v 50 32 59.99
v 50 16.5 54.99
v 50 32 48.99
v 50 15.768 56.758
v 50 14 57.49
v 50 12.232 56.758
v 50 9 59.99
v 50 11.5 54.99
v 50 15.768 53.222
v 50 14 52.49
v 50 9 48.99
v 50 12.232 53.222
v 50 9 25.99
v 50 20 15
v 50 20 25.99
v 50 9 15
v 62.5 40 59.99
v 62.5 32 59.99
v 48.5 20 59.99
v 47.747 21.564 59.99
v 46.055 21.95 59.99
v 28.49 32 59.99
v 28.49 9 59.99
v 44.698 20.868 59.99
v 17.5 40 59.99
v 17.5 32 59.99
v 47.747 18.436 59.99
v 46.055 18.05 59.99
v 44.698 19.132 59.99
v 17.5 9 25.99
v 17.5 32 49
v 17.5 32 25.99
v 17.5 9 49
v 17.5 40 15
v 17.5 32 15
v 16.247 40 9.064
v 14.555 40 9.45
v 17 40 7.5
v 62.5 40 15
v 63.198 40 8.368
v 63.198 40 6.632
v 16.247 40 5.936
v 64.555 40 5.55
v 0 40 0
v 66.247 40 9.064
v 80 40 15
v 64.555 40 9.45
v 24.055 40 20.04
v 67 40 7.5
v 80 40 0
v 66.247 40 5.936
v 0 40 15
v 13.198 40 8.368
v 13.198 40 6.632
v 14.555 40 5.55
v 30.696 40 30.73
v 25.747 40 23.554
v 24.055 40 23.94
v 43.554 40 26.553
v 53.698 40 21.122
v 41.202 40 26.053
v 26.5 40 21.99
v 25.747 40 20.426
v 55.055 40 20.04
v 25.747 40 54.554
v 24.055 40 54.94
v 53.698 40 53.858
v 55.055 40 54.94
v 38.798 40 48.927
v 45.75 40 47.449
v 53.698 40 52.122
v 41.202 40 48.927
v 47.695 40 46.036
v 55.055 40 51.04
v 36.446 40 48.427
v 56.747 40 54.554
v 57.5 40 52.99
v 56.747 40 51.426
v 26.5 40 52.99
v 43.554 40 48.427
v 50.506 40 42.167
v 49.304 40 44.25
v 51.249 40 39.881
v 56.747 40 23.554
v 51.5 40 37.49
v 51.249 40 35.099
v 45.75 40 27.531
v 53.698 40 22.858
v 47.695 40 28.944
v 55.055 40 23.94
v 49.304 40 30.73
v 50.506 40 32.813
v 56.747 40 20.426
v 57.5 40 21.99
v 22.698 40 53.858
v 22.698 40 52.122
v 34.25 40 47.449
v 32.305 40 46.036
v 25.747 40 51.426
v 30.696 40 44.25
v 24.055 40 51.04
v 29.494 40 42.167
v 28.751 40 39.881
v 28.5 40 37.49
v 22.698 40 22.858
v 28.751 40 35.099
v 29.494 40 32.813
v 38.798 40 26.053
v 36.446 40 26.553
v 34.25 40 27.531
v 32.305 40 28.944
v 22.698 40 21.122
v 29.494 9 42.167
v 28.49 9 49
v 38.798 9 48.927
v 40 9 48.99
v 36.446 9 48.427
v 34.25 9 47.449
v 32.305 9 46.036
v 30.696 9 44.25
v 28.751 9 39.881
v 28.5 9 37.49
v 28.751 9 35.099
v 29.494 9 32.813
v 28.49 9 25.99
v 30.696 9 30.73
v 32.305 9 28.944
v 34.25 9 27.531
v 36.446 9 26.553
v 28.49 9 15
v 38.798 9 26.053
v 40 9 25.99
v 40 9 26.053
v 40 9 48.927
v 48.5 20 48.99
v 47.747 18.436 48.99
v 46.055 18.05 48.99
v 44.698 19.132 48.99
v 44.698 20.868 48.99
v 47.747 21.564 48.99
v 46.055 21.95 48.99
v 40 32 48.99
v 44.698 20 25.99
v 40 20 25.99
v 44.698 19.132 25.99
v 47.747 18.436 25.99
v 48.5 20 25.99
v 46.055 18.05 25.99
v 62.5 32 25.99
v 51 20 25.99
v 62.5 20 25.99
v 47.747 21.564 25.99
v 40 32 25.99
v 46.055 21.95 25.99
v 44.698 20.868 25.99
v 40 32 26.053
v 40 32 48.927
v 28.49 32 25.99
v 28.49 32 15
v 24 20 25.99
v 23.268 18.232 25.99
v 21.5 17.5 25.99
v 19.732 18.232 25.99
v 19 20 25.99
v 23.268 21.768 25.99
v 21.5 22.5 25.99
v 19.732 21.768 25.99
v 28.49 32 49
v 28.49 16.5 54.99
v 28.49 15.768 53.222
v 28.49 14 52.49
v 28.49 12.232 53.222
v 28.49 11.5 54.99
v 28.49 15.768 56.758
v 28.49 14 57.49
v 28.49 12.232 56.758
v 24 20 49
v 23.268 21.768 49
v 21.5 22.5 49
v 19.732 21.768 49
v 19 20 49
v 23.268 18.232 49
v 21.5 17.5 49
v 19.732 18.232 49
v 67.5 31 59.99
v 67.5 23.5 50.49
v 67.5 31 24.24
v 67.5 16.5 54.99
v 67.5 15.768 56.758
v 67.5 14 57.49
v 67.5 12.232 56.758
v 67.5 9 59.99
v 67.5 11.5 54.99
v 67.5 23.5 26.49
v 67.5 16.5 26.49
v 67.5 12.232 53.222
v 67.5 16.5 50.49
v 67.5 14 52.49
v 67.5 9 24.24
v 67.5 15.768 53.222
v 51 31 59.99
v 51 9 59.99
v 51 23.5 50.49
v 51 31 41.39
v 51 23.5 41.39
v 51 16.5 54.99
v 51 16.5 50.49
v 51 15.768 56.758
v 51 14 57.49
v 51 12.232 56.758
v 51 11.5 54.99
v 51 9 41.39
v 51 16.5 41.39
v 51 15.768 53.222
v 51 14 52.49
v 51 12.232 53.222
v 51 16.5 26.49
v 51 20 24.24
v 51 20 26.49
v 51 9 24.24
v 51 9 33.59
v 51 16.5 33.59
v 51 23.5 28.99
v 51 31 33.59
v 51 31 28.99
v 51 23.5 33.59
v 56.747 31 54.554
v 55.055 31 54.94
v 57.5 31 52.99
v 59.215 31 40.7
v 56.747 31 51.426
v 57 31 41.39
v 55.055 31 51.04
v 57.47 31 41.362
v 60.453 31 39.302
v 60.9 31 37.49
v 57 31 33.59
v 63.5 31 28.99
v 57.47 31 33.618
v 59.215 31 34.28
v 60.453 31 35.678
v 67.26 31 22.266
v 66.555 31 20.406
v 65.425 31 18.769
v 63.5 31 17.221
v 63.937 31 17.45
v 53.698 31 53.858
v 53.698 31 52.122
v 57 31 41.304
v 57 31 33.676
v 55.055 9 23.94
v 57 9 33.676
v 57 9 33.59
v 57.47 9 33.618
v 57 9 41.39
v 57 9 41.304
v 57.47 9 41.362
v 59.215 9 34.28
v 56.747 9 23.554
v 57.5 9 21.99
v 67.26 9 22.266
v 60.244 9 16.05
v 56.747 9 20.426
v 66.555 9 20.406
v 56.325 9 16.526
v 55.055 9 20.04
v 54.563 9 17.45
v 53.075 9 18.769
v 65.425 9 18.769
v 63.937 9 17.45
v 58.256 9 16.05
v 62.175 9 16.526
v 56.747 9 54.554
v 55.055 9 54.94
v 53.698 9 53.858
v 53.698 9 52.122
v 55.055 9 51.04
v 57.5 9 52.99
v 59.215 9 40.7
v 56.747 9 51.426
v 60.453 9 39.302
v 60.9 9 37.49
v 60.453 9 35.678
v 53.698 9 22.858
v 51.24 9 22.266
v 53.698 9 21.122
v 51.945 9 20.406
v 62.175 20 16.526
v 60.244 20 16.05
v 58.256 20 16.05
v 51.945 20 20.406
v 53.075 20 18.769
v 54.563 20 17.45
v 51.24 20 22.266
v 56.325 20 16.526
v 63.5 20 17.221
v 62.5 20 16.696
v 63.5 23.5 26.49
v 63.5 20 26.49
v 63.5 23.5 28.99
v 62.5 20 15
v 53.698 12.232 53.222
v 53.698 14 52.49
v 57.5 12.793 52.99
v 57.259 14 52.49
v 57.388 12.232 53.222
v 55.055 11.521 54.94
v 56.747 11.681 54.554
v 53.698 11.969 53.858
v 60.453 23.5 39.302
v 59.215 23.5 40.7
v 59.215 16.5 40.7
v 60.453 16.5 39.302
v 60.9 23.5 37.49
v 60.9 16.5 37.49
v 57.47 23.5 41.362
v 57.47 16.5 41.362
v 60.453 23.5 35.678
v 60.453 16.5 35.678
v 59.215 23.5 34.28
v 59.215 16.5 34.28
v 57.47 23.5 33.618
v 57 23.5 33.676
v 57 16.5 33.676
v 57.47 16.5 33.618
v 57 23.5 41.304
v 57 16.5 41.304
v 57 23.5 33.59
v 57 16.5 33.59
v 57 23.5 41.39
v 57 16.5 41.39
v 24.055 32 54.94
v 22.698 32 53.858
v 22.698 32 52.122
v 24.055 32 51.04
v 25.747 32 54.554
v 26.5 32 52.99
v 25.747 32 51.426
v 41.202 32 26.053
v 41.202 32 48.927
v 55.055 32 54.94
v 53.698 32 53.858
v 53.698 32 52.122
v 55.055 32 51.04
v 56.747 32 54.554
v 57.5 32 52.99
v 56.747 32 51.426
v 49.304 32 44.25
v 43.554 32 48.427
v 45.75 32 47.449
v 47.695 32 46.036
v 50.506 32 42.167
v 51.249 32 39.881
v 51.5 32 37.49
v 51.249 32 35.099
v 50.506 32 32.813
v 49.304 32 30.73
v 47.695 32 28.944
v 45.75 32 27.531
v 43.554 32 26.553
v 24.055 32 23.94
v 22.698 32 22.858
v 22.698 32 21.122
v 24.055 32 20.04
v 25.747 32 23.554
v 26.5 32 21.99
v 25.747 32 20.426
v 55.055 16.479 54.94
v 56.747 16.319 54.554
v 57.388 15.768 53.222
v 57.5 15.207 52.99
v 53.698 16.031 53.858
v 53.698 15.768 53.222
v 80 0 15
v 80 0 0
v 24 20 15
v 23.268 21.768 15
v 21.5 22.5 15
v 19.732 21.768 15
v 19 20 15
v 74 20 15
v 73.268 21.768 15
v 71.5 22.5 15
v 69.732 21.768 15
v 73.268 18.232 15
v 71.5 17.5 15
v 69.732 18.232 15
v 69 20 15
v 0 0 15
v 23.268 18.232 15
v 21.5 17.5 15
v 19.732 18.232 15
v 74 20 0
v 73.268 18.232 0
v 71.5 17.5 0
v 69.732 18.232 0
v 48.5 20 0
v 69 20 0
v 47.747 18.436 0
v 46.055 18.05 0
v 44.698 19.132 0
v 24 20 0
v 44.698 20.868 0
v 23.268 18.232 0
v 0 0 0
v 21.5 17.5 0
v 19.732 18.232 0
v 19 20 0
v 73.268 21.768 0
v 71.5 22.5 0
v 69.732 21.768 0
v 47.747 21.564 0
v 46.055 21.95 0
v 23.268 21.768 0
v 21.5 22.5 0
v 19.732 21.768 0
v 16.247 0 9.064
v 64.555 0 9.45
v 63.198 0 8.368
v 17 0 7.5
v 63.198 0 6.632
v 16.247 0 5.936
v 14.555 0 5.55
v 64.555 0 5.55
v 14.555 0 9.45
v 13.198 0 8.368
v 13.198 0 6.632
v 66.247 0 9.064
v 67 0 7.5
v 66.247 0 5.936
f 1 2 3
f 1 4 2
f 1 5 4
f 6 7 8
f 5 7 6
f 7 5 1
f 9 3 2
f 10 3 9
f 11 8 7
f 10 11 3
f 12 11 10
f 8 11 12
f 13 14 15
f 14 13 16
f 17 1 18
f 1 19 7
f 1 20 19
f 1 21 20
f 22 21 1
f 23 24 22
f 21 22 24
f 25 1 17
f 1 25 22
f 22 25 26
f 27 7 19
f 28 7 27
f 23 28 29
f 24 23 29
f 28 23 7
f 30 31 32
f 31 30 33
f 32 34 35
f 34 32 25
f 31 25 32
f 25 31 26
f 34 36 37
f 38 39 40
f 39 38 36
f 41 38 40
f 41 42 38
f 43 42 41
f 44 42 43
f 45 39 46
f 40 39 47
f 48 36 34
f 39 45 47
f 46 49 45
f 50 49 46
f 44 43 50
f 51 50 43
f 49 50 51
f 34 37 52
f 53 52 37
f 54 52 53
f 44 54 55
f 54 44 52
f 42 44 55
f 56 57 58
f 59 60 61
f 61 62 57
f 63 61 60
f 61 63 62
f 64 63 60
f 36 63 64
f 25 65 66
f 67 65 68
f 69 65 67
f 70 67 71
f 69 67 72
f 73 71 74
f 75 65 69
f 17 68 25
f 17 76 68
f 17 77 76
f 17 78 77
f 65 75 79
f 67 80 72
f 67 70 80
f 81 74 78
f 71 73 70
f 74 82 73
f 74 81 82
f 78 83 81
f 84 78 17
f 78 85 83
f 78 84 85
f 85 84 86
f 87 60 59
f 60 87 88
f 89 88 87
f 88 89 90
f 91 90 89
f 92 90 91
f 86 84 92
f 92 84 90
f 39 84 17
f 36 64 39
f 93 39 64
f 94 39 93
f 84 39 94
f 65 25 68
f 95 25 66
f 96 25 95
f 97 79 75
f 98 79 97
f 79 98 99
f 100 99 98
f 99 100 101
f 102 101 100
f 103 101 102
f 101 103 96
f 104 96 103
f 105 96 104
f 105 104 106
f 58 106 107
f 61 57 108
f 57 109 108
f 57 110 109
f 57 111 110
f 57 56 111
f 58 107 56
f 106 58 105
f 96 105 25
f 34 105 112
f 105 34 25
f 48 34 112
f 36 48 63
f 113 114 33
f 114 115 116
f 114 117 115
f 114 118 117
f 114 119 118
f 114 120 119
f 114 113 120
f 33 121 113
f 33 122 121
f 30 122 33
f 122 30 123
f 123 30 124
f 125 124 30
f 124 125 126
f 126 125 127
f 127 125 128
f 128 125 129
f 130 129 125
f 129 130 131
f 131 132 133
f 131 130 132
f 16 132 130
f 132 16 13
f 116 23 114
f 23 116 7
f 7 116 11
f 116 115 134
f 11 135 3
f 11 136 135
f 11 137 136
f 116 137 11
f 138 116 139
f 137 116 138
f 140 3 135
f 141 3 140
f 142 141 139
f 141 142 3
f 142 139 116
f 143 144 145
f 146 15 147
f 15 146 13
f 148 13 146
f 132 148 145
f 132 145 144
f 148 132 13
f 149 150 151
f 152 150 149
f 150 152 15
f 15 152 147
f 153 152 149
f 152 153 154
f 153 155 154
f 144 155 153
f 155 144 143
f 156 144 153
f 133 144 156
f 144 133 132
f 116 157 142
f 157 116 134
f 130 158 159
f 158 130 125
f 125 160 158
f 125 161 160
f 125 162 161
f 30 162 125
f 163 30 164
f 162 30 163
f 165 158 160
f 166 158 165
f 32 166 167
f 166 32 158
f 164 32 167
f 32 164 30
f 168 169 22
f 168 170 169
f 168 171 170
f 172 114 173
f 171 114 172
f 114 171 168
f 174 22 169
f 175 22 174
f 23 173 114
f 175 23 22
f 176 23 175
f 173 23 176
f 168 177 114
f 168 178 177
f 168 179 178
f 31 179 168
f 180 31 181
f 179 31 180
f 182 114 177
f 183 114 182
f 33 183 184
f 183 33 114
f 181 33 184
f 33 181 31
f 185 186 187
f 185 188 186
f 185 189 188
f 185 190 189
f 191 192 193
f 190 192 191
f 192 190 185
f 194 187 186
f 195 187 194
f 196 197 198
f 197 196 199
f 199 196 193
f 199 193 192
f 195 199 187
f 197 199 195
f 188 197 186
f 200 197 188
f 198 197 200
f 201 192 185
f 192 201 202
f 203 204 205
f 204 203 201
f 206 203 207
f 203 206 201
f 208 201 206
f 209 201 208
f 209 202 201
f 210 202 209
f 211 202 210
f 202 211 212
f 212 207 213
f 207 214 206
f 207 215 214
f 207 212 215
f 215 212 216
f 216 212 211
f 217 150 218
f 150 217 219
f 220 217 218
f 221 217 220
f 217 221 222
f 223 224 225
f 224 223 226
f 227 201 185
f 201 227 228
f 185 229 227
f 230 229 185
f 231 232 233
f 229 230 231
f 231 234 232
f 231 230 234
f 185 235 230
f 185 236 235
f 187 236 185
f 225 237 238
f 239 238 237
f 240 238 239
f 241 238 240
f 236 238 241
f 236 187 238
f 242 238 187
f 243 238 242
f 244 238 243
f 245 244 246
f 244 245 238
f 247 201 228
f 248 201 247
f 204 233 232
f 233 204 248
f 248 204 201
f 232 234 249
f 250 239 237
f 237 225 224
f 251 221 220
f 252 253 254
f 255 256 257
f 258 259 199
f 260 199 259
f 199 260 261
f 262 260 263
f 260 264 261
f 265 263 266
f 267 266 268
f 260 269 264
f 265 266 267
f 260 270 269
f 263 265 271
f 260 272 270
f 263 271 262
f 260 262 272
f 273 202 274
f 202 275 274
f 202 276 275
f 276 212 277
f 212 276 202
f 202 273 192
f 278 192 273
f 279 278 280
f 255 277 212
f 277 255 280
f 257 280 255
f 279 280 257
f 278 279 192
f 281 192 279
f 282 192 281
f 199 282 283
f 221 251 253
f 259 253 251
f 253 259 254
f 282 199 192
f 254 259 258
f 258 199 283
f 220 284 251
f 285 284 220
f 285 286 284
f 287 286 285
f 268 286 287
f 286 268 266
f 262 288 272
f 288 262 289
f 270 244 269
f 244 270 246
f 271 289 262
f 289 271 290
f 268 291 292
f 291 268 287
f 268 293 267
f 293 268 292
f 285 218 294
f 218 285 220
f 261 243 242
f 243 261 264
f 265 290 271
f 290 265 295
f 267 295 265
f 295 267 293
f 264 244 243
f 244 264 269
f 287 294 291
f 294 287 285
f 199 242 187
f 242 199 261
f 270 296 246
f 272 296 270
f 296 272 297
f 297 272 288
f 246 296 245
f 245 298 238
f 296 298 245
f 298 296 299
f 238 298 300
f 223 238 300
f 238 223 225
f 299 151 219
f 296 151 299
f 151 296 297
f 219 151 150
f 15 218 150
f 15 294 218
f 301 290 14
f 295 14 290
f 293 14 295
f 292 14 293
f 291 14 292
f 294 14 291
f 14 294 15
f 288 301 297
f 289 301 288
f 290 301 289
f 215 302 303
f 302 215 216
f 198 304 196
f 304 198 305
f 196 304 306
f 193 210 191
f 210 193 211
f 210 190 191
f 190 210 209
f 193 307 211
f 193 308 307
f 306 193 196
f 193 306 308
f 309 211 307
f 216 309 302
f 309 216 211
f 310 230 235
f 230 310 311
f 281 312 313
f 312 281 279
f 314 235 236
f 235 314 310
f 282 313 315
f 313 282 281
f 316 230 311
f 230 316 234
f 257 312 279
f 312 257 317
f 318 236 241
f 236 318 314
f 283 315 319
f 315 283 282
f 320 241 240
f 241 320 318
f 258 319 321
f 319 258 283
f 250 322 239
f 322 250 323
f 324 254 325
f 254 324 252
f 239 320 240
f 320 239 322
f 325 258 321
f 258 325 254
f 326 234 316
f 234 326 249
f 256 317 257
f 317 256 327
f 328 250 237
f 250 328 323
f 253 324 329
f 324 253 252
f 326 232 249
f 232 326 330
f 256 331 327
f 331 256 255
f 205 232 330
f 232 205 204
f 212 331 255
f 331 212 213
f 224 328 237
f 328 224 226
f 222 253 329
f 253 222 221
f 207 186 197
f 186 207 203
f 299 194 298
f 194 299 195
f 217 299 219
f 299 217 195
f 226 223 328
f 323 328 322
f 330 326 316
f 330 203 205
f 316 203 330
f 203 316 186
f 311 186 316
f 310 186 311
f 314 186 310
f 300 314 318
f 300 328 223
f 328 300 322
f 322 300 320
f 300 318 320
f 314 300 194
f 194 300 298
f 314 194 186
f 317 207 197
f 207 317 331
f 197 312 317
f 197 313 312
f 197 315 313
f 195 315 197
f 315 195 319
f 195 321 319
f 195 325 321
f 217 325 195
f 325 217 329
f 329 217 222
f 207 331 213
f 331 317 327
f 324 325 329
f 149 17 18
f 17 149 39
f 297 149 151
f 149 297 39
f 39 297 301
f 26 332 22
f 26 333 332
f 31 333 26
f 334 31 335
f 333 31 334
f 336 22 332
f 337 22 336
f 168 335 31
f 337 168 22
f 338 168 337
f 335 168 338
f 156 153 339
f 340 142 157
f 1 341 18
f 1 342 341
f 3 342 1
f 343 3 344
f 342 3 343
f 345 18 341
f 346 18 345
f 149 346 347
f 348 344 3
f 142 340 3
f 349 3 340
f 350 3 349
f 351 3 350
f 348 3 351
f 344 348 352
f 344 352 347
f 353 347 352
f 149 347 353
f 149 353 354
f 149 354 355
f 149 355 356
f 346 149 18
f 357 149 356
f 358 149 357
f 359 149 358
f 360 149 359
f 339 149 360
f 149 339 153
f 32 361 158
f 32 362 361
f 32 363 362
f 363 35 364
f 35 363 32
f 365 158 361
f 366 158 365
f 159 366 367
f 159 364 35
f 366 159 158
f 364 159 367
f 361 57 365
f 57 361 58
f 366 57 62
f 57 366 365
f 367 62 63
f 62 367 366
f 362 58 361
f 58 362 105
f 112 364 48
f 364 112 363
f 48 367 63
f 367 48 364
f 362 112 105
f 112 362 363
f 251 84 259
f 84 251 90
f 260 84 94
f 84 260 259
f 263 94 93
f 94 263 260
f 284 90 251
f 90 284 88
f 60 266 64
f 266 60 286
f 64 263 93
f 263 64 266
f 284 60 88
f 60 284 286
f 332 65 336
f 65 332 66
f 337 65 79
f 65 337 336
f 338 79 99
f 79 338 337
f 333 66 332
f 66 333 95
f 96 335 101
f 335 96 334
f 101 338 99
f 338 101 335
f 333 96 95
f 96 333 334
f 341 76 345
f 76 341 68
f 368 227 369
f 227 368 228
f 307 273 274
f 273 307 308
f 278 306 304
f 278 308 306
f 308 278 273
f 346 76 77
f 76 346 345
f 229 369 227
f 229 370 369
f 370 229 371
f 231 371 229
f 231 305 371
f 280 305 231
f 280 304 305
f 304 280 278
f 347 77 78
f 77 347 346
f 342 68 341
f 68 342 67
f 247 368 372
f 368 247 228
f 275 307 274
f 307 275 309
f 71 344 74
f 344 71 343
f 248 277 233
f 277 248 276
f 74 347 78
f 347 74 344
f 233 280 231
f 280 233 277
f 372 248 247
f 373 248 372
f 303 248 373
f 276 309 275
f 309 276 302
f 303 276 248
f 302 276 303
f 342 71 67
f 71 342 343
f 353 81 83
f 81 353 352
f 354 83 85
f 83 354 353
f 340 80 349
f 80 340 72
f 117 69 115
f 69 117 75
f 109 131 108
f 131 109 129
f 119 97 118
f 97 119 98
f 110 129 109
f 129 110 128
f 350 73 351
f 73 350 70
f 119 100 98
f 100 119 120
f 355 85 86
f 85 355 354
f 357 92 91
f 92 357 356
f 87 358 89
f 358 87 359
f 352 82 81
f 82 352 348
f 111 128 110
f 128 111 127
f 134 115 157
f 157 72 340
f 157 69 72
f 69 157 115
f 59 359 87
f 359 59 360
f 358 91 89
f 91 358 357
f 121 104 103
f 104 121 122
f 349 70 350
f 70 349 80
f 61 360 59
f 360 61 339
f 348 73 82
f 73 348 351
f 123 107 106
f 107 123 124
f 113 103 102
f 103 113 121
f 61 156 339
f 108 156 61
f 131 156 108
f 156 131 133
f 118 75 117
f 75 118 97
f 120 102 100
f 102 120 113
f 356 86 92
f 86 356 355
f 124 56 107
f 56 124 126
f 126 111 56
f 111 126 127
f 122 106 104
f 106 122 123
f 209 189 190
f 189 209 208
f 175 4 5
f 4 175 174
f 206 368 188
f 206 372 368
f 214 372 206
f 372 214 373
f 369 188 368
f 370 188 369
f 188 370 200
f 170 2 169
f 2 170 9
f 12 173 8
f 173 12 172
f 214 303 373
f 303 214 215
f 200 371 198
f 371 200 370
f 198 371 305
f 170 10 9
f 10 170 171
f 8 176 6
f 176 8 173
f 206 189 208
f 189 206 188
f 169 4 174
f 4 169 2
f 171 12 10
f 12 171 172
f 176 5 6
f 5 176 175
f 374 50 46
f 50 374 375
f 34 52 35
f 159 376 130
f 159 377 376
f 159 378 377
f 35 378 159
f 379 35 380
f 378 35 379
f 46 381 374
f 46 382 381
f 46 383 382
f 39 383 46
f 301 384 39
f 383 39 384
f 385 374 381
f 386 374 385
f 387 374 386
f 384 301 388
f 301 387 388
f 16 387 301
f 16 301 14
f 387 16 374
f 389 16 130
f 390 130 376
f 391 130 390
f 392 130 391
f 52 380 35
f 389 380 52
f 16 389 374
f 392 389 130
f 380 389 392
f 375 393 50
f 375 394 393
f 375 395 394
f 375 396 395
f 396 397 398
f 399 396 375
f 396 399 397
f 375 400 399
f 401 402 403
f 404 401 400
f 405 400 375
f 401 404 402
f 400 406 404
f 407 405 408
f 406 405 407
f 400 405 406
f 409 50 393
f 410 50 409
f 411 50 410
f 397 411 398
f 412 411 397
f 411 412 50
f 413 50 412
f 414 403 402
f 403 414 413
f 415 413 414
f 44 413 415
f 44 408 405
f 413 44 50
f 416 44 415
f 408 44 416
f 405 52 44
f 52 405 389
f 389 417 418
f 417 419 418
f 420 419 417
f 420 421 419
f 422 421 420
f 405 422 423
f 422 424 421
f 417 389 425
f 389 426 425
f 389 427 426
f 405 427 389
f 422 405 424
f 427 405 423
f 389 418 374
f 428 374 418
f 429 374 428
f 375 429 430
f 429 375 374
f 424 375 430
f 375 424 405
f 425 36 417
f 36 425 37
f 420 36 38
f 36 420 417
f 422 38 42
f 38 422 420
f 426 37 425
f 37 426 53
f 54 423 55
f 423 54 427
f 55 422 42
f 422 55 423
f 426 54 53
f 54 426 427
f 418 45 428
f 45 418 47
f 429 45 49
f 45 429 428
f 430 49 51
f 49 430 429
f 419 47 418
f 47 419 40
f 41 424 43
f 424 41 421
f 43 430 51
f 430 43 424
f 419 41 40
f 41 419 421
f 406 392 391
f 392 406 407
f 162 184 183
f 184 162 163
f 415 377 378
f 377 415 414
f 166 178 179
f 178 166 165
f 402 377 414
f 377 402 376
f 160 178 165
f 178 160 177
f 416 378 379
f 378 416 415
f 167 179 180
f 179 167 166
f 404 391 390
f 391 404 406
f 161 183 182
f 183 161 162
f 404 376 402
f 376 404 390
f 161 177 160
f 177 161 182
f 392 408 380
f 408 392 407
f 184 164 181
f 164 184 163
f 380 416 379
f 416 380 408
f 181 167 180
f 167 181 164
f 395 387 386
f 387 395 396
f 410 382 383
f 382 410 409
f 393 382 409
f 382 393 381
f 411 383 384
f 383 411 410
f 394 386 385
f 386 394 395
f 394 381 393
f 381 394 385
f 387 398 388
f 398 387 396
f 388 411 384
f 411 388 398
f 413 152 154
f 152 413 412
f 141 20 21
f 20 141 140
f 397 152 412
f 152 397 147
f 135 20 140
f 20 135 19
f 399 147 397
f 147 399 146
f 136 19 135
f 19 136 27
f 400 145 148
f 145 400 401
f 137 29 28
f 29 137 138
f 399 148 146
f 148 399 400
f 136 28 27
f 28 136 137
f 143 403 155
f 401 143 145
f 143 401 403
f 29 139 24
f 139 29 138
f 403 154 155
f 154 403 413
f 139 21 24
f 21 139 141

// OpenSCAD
//include <MCAD/math.scad>
//use <MCAD/motors.scad>
//mm_per_inch=25.4;


fary_largo=70; //FIXME!
filamento_diametro=3;
filamento_margen=1;

//Hobbed mini-hyena
hobbed_fuer_d=12.4;
hobbed_surco_d=10;
hobbed_dentro_d=5;
hobbed_ancho=10;
hobbed_ancho_base=7.3;

//Extrusor
bolt_hole_distance = 31;
bolt_diameter=4;
shaft_diameter=22+1;
extruder_bolt_margen=7;
extruder_largo=bolt_hole_distance+2*extruder_bolt_margen;
extruder_alto=extruder_largo;
extruder_ancho=8;

//Idler
idler_margen=1;
idler_redondeo=3;

idler_ancho=22;
idler_alto=extruder_alto-idler_margen;

	//Bisagra idler
	bisagra_largo=extruder_largo/2;
	bisagra_alto=(extruder_alto-shaft_diameter)/2;
	bisagra_ancho=idler_ancho/2+idler_margen+extruder_ancho;
	bisagra_x_offset=extruder_largo/2;
	
	//Bloque guia (idler fijo)
	guia_margen=2;
	guia_largo=extruder_largo/2+hobbed_surco_d/2+filamento_diametro+guia_margen;
	guia_alto=extruder_alto;
	guia_ancho=idler_ancho+idler_margen+extruder_ancho;

idler_largo_exceso=5;

idler_max_largo_izquierda=extruder_largo/2-(hobbed_surco_d/2+filamento_diametro+guia_margen);
idler_largo=extruder_largo/2-(hobbed_surco_d/2+filamento_diametro+guia_margen)-idler_margen+idler_largo_exceso;

idler_bolt_margen=5;



//Apoyo hotend
base_largo=80;
base_alto=15;
base_ancho=40;
  //Tornillos fary
  t_fary_d=4+1;
  t_fary_separacion=50;
  //Tornillos anclaje
  t_anclaje_d=3+1;
  t_anclaje_separacion=50;
  t_anclaje_desfase=0;
  

//Motor virtual
//translate([(base_largo-extruder_largo)/2,base_ancho,base_alto-0.01]) translate([extruder_largo/2,0,extruder_largo/2]) rotate([90,0,0]) stepper_motor_mount(17);

difference() {
union() {
//Extrusor
  translate([(base_largo-extruder_largo)/2,base_ancho,base_alto-0.01]){
    difference(){
      union(){
        //Ancalje motor
        color("red") translate([0,-extruder_ancho,0]) cube([extruder_largo,extruder_ancho,extruder_alto]);
        
        //Bloque guia (idler fijo)
        color("red") translate([0,-guia_ancho,0]) difference() {
          cube([guia_largo,guia_ancho,guia_alto]);
          //Rebaje hobbed-idler
          translate([extruder_largo/2,-500,extruder_alto/2-shaft_diameter/2]) cube([1000,1000,shaft_diameter]);
          //Rebaje tornillo abajo
          translate([-0.01,-500,0]) cube([extruder_bolt_margen+4,1000,extruder_bolt_margen+4]);

          //Rebaje tornillo arriba
          translate([-0.01,-500,extruder_alto-(extruder_bolt_margen+4)+0.01]) cube([extruder_bolt_margen+4,1000,extruder_bolt_margen+4]);
        }

        //Bisagra idler
        color("red") translate([bisagra_x_offset,-bisagra_ancho,0]) union() {
          cube([bisagra_largo,bisagra_ancho,bisagra_alto]);
        }

        //Idler
        color("blue") translate(
          [ extruder_largo-idler_largo+idler_largo_exceso,
            -idler_ancho-extruder_ancho-idler_margen,
            idler_margen
          ]) difference() {
          union() {
             //Prisma
	          translate([0,0,idler_largo/2]) cube([idler_largo,idler_ancho,idler_alto-idler_largo/2]);
             //Cilindro
	          translate([idler_largo/2,idler_ancho/2,idler_largo/2]) rotate([90,0,0]) cylinder(d=idler_largo, h=idler_ancho, center=true);
	       }
          //Resta bloque bisagra FIXME 
          translate([-1,idler_ancho/2,-idler_margen])
            cube([idler_largo-3, idler_ancho/2+0.01, bisagra_alto+idler_redondeo]);

          //Tornillo(s) de apriete
          translate([0,idler_bolt_margen,idler_alto-idler_bolt_margen]) 
            rotate([0,-90,0]) cylinder(d=t_fary_d, h=1000, center=true);

          //Tornillo eje FIXME!
          translate([(11-3-2),0,extruder_alto/2-idler_margen]) 
            rotate([90,0,0]) cylinder(d=7.8, h=1000, center=true);
          
          translate([-100+(11-3-2),-50,extruder_alto/2-idler_margen-7.8/2]) 
            cube([100,100,7.8]);
          

          //Agujero rodamiento
          translate([-50,+idler_ancho/2-7/2,extruder_alto/2-24/2]) 
            cube([100,7,24]);

          //Eje rodamiento
        }
      }

      //Tornillos motor
      translate([extruder_bolt_margen,0,extruder_bolt_margen]) rotate([90,0,0]) cylinder(d=bolt_diameter, h=1000, center=true);

      translate([extruder_bolt_margen+bolt_hole_distance,0,extruder_bolt_margen]) rotate([90,0,0]) cylinder(d=bolt_diameter, h=1000, center=true);

      translate([extruder_bolt_margen,0,extruder_bolt_margen+bolt_hole_distance]) rotate([90,0,0]) cylinder(d=bolt_diameter, h=1000, center=true);

      translate([extruder_bolt_margen+bolt_hole_distance,0,extruder_bolt_margen+bolt_hole_distance]) rotate([90,0,0]) cylinder(d=bolt_diameter, h=1000, center=true);


      //Agujero shaft
      translate([extruder_largo/2,0,extruder_alto/2]) rotate([90,0,0]) cylinder(d=shaft_diameter, h=1000, center=true);

      //Tornillo(s) de apriete
      translate(
          [ extruder_largo-idler_largo,
            -idler_ancho-extruder_ancho-idler_margen,
            idler_margen
          ])
        translate([0,idler_bolt_margen,idler_alto-idler_bolt_margen]) 
          rotate([0,-90,0]) cylinder(d=t_fary_d, h=1000, center=true);

    }
  }

//Apoyo hotend
  difference() {
    cube([base_largo,base_ancho,base_alto]);
    
  //Tornillos ancalaje
    translate([base_largo/2-t_anclaje_separacion/2+t_anclaje_desfase,0,base_alto/2]) rotate([90,0,0]) cylinder(d=t_anclaje_d, h=1000, center=true);

    translate([base_largo/2+t_anclaje_separacion/2+t_anclaje_desfase,0,base_alto/2]) rotate([90,0,0]) cylinder(d=t_anclaje_d, h=1000, center=true);    
  }
}

  //Tornillos fary
translate([base_largo/2+hobbed_surco_d/2+filamento_diametro/2-t_fary_separacion/2,base_ancho/2,base_alto/2]) cylinder(d=t_fary_d, h=1000, center=true);

translate([base_largo/2+hobbed_surco_d/2+filamento_diametro/2+t_fary_separacion/2,base_ancho/2,base_alto/2]) cylinder(d=t_fary_d, h=1000, center=true);

//Agujero filamento
translate([base_largo/2+hobbed_surco_d/2+filamento_diametro/2,base_ancho-base_ancho/2,0]) 
  cylinder(d=filamento_diametro+filamento_margen, h=1000, center=true);

}
